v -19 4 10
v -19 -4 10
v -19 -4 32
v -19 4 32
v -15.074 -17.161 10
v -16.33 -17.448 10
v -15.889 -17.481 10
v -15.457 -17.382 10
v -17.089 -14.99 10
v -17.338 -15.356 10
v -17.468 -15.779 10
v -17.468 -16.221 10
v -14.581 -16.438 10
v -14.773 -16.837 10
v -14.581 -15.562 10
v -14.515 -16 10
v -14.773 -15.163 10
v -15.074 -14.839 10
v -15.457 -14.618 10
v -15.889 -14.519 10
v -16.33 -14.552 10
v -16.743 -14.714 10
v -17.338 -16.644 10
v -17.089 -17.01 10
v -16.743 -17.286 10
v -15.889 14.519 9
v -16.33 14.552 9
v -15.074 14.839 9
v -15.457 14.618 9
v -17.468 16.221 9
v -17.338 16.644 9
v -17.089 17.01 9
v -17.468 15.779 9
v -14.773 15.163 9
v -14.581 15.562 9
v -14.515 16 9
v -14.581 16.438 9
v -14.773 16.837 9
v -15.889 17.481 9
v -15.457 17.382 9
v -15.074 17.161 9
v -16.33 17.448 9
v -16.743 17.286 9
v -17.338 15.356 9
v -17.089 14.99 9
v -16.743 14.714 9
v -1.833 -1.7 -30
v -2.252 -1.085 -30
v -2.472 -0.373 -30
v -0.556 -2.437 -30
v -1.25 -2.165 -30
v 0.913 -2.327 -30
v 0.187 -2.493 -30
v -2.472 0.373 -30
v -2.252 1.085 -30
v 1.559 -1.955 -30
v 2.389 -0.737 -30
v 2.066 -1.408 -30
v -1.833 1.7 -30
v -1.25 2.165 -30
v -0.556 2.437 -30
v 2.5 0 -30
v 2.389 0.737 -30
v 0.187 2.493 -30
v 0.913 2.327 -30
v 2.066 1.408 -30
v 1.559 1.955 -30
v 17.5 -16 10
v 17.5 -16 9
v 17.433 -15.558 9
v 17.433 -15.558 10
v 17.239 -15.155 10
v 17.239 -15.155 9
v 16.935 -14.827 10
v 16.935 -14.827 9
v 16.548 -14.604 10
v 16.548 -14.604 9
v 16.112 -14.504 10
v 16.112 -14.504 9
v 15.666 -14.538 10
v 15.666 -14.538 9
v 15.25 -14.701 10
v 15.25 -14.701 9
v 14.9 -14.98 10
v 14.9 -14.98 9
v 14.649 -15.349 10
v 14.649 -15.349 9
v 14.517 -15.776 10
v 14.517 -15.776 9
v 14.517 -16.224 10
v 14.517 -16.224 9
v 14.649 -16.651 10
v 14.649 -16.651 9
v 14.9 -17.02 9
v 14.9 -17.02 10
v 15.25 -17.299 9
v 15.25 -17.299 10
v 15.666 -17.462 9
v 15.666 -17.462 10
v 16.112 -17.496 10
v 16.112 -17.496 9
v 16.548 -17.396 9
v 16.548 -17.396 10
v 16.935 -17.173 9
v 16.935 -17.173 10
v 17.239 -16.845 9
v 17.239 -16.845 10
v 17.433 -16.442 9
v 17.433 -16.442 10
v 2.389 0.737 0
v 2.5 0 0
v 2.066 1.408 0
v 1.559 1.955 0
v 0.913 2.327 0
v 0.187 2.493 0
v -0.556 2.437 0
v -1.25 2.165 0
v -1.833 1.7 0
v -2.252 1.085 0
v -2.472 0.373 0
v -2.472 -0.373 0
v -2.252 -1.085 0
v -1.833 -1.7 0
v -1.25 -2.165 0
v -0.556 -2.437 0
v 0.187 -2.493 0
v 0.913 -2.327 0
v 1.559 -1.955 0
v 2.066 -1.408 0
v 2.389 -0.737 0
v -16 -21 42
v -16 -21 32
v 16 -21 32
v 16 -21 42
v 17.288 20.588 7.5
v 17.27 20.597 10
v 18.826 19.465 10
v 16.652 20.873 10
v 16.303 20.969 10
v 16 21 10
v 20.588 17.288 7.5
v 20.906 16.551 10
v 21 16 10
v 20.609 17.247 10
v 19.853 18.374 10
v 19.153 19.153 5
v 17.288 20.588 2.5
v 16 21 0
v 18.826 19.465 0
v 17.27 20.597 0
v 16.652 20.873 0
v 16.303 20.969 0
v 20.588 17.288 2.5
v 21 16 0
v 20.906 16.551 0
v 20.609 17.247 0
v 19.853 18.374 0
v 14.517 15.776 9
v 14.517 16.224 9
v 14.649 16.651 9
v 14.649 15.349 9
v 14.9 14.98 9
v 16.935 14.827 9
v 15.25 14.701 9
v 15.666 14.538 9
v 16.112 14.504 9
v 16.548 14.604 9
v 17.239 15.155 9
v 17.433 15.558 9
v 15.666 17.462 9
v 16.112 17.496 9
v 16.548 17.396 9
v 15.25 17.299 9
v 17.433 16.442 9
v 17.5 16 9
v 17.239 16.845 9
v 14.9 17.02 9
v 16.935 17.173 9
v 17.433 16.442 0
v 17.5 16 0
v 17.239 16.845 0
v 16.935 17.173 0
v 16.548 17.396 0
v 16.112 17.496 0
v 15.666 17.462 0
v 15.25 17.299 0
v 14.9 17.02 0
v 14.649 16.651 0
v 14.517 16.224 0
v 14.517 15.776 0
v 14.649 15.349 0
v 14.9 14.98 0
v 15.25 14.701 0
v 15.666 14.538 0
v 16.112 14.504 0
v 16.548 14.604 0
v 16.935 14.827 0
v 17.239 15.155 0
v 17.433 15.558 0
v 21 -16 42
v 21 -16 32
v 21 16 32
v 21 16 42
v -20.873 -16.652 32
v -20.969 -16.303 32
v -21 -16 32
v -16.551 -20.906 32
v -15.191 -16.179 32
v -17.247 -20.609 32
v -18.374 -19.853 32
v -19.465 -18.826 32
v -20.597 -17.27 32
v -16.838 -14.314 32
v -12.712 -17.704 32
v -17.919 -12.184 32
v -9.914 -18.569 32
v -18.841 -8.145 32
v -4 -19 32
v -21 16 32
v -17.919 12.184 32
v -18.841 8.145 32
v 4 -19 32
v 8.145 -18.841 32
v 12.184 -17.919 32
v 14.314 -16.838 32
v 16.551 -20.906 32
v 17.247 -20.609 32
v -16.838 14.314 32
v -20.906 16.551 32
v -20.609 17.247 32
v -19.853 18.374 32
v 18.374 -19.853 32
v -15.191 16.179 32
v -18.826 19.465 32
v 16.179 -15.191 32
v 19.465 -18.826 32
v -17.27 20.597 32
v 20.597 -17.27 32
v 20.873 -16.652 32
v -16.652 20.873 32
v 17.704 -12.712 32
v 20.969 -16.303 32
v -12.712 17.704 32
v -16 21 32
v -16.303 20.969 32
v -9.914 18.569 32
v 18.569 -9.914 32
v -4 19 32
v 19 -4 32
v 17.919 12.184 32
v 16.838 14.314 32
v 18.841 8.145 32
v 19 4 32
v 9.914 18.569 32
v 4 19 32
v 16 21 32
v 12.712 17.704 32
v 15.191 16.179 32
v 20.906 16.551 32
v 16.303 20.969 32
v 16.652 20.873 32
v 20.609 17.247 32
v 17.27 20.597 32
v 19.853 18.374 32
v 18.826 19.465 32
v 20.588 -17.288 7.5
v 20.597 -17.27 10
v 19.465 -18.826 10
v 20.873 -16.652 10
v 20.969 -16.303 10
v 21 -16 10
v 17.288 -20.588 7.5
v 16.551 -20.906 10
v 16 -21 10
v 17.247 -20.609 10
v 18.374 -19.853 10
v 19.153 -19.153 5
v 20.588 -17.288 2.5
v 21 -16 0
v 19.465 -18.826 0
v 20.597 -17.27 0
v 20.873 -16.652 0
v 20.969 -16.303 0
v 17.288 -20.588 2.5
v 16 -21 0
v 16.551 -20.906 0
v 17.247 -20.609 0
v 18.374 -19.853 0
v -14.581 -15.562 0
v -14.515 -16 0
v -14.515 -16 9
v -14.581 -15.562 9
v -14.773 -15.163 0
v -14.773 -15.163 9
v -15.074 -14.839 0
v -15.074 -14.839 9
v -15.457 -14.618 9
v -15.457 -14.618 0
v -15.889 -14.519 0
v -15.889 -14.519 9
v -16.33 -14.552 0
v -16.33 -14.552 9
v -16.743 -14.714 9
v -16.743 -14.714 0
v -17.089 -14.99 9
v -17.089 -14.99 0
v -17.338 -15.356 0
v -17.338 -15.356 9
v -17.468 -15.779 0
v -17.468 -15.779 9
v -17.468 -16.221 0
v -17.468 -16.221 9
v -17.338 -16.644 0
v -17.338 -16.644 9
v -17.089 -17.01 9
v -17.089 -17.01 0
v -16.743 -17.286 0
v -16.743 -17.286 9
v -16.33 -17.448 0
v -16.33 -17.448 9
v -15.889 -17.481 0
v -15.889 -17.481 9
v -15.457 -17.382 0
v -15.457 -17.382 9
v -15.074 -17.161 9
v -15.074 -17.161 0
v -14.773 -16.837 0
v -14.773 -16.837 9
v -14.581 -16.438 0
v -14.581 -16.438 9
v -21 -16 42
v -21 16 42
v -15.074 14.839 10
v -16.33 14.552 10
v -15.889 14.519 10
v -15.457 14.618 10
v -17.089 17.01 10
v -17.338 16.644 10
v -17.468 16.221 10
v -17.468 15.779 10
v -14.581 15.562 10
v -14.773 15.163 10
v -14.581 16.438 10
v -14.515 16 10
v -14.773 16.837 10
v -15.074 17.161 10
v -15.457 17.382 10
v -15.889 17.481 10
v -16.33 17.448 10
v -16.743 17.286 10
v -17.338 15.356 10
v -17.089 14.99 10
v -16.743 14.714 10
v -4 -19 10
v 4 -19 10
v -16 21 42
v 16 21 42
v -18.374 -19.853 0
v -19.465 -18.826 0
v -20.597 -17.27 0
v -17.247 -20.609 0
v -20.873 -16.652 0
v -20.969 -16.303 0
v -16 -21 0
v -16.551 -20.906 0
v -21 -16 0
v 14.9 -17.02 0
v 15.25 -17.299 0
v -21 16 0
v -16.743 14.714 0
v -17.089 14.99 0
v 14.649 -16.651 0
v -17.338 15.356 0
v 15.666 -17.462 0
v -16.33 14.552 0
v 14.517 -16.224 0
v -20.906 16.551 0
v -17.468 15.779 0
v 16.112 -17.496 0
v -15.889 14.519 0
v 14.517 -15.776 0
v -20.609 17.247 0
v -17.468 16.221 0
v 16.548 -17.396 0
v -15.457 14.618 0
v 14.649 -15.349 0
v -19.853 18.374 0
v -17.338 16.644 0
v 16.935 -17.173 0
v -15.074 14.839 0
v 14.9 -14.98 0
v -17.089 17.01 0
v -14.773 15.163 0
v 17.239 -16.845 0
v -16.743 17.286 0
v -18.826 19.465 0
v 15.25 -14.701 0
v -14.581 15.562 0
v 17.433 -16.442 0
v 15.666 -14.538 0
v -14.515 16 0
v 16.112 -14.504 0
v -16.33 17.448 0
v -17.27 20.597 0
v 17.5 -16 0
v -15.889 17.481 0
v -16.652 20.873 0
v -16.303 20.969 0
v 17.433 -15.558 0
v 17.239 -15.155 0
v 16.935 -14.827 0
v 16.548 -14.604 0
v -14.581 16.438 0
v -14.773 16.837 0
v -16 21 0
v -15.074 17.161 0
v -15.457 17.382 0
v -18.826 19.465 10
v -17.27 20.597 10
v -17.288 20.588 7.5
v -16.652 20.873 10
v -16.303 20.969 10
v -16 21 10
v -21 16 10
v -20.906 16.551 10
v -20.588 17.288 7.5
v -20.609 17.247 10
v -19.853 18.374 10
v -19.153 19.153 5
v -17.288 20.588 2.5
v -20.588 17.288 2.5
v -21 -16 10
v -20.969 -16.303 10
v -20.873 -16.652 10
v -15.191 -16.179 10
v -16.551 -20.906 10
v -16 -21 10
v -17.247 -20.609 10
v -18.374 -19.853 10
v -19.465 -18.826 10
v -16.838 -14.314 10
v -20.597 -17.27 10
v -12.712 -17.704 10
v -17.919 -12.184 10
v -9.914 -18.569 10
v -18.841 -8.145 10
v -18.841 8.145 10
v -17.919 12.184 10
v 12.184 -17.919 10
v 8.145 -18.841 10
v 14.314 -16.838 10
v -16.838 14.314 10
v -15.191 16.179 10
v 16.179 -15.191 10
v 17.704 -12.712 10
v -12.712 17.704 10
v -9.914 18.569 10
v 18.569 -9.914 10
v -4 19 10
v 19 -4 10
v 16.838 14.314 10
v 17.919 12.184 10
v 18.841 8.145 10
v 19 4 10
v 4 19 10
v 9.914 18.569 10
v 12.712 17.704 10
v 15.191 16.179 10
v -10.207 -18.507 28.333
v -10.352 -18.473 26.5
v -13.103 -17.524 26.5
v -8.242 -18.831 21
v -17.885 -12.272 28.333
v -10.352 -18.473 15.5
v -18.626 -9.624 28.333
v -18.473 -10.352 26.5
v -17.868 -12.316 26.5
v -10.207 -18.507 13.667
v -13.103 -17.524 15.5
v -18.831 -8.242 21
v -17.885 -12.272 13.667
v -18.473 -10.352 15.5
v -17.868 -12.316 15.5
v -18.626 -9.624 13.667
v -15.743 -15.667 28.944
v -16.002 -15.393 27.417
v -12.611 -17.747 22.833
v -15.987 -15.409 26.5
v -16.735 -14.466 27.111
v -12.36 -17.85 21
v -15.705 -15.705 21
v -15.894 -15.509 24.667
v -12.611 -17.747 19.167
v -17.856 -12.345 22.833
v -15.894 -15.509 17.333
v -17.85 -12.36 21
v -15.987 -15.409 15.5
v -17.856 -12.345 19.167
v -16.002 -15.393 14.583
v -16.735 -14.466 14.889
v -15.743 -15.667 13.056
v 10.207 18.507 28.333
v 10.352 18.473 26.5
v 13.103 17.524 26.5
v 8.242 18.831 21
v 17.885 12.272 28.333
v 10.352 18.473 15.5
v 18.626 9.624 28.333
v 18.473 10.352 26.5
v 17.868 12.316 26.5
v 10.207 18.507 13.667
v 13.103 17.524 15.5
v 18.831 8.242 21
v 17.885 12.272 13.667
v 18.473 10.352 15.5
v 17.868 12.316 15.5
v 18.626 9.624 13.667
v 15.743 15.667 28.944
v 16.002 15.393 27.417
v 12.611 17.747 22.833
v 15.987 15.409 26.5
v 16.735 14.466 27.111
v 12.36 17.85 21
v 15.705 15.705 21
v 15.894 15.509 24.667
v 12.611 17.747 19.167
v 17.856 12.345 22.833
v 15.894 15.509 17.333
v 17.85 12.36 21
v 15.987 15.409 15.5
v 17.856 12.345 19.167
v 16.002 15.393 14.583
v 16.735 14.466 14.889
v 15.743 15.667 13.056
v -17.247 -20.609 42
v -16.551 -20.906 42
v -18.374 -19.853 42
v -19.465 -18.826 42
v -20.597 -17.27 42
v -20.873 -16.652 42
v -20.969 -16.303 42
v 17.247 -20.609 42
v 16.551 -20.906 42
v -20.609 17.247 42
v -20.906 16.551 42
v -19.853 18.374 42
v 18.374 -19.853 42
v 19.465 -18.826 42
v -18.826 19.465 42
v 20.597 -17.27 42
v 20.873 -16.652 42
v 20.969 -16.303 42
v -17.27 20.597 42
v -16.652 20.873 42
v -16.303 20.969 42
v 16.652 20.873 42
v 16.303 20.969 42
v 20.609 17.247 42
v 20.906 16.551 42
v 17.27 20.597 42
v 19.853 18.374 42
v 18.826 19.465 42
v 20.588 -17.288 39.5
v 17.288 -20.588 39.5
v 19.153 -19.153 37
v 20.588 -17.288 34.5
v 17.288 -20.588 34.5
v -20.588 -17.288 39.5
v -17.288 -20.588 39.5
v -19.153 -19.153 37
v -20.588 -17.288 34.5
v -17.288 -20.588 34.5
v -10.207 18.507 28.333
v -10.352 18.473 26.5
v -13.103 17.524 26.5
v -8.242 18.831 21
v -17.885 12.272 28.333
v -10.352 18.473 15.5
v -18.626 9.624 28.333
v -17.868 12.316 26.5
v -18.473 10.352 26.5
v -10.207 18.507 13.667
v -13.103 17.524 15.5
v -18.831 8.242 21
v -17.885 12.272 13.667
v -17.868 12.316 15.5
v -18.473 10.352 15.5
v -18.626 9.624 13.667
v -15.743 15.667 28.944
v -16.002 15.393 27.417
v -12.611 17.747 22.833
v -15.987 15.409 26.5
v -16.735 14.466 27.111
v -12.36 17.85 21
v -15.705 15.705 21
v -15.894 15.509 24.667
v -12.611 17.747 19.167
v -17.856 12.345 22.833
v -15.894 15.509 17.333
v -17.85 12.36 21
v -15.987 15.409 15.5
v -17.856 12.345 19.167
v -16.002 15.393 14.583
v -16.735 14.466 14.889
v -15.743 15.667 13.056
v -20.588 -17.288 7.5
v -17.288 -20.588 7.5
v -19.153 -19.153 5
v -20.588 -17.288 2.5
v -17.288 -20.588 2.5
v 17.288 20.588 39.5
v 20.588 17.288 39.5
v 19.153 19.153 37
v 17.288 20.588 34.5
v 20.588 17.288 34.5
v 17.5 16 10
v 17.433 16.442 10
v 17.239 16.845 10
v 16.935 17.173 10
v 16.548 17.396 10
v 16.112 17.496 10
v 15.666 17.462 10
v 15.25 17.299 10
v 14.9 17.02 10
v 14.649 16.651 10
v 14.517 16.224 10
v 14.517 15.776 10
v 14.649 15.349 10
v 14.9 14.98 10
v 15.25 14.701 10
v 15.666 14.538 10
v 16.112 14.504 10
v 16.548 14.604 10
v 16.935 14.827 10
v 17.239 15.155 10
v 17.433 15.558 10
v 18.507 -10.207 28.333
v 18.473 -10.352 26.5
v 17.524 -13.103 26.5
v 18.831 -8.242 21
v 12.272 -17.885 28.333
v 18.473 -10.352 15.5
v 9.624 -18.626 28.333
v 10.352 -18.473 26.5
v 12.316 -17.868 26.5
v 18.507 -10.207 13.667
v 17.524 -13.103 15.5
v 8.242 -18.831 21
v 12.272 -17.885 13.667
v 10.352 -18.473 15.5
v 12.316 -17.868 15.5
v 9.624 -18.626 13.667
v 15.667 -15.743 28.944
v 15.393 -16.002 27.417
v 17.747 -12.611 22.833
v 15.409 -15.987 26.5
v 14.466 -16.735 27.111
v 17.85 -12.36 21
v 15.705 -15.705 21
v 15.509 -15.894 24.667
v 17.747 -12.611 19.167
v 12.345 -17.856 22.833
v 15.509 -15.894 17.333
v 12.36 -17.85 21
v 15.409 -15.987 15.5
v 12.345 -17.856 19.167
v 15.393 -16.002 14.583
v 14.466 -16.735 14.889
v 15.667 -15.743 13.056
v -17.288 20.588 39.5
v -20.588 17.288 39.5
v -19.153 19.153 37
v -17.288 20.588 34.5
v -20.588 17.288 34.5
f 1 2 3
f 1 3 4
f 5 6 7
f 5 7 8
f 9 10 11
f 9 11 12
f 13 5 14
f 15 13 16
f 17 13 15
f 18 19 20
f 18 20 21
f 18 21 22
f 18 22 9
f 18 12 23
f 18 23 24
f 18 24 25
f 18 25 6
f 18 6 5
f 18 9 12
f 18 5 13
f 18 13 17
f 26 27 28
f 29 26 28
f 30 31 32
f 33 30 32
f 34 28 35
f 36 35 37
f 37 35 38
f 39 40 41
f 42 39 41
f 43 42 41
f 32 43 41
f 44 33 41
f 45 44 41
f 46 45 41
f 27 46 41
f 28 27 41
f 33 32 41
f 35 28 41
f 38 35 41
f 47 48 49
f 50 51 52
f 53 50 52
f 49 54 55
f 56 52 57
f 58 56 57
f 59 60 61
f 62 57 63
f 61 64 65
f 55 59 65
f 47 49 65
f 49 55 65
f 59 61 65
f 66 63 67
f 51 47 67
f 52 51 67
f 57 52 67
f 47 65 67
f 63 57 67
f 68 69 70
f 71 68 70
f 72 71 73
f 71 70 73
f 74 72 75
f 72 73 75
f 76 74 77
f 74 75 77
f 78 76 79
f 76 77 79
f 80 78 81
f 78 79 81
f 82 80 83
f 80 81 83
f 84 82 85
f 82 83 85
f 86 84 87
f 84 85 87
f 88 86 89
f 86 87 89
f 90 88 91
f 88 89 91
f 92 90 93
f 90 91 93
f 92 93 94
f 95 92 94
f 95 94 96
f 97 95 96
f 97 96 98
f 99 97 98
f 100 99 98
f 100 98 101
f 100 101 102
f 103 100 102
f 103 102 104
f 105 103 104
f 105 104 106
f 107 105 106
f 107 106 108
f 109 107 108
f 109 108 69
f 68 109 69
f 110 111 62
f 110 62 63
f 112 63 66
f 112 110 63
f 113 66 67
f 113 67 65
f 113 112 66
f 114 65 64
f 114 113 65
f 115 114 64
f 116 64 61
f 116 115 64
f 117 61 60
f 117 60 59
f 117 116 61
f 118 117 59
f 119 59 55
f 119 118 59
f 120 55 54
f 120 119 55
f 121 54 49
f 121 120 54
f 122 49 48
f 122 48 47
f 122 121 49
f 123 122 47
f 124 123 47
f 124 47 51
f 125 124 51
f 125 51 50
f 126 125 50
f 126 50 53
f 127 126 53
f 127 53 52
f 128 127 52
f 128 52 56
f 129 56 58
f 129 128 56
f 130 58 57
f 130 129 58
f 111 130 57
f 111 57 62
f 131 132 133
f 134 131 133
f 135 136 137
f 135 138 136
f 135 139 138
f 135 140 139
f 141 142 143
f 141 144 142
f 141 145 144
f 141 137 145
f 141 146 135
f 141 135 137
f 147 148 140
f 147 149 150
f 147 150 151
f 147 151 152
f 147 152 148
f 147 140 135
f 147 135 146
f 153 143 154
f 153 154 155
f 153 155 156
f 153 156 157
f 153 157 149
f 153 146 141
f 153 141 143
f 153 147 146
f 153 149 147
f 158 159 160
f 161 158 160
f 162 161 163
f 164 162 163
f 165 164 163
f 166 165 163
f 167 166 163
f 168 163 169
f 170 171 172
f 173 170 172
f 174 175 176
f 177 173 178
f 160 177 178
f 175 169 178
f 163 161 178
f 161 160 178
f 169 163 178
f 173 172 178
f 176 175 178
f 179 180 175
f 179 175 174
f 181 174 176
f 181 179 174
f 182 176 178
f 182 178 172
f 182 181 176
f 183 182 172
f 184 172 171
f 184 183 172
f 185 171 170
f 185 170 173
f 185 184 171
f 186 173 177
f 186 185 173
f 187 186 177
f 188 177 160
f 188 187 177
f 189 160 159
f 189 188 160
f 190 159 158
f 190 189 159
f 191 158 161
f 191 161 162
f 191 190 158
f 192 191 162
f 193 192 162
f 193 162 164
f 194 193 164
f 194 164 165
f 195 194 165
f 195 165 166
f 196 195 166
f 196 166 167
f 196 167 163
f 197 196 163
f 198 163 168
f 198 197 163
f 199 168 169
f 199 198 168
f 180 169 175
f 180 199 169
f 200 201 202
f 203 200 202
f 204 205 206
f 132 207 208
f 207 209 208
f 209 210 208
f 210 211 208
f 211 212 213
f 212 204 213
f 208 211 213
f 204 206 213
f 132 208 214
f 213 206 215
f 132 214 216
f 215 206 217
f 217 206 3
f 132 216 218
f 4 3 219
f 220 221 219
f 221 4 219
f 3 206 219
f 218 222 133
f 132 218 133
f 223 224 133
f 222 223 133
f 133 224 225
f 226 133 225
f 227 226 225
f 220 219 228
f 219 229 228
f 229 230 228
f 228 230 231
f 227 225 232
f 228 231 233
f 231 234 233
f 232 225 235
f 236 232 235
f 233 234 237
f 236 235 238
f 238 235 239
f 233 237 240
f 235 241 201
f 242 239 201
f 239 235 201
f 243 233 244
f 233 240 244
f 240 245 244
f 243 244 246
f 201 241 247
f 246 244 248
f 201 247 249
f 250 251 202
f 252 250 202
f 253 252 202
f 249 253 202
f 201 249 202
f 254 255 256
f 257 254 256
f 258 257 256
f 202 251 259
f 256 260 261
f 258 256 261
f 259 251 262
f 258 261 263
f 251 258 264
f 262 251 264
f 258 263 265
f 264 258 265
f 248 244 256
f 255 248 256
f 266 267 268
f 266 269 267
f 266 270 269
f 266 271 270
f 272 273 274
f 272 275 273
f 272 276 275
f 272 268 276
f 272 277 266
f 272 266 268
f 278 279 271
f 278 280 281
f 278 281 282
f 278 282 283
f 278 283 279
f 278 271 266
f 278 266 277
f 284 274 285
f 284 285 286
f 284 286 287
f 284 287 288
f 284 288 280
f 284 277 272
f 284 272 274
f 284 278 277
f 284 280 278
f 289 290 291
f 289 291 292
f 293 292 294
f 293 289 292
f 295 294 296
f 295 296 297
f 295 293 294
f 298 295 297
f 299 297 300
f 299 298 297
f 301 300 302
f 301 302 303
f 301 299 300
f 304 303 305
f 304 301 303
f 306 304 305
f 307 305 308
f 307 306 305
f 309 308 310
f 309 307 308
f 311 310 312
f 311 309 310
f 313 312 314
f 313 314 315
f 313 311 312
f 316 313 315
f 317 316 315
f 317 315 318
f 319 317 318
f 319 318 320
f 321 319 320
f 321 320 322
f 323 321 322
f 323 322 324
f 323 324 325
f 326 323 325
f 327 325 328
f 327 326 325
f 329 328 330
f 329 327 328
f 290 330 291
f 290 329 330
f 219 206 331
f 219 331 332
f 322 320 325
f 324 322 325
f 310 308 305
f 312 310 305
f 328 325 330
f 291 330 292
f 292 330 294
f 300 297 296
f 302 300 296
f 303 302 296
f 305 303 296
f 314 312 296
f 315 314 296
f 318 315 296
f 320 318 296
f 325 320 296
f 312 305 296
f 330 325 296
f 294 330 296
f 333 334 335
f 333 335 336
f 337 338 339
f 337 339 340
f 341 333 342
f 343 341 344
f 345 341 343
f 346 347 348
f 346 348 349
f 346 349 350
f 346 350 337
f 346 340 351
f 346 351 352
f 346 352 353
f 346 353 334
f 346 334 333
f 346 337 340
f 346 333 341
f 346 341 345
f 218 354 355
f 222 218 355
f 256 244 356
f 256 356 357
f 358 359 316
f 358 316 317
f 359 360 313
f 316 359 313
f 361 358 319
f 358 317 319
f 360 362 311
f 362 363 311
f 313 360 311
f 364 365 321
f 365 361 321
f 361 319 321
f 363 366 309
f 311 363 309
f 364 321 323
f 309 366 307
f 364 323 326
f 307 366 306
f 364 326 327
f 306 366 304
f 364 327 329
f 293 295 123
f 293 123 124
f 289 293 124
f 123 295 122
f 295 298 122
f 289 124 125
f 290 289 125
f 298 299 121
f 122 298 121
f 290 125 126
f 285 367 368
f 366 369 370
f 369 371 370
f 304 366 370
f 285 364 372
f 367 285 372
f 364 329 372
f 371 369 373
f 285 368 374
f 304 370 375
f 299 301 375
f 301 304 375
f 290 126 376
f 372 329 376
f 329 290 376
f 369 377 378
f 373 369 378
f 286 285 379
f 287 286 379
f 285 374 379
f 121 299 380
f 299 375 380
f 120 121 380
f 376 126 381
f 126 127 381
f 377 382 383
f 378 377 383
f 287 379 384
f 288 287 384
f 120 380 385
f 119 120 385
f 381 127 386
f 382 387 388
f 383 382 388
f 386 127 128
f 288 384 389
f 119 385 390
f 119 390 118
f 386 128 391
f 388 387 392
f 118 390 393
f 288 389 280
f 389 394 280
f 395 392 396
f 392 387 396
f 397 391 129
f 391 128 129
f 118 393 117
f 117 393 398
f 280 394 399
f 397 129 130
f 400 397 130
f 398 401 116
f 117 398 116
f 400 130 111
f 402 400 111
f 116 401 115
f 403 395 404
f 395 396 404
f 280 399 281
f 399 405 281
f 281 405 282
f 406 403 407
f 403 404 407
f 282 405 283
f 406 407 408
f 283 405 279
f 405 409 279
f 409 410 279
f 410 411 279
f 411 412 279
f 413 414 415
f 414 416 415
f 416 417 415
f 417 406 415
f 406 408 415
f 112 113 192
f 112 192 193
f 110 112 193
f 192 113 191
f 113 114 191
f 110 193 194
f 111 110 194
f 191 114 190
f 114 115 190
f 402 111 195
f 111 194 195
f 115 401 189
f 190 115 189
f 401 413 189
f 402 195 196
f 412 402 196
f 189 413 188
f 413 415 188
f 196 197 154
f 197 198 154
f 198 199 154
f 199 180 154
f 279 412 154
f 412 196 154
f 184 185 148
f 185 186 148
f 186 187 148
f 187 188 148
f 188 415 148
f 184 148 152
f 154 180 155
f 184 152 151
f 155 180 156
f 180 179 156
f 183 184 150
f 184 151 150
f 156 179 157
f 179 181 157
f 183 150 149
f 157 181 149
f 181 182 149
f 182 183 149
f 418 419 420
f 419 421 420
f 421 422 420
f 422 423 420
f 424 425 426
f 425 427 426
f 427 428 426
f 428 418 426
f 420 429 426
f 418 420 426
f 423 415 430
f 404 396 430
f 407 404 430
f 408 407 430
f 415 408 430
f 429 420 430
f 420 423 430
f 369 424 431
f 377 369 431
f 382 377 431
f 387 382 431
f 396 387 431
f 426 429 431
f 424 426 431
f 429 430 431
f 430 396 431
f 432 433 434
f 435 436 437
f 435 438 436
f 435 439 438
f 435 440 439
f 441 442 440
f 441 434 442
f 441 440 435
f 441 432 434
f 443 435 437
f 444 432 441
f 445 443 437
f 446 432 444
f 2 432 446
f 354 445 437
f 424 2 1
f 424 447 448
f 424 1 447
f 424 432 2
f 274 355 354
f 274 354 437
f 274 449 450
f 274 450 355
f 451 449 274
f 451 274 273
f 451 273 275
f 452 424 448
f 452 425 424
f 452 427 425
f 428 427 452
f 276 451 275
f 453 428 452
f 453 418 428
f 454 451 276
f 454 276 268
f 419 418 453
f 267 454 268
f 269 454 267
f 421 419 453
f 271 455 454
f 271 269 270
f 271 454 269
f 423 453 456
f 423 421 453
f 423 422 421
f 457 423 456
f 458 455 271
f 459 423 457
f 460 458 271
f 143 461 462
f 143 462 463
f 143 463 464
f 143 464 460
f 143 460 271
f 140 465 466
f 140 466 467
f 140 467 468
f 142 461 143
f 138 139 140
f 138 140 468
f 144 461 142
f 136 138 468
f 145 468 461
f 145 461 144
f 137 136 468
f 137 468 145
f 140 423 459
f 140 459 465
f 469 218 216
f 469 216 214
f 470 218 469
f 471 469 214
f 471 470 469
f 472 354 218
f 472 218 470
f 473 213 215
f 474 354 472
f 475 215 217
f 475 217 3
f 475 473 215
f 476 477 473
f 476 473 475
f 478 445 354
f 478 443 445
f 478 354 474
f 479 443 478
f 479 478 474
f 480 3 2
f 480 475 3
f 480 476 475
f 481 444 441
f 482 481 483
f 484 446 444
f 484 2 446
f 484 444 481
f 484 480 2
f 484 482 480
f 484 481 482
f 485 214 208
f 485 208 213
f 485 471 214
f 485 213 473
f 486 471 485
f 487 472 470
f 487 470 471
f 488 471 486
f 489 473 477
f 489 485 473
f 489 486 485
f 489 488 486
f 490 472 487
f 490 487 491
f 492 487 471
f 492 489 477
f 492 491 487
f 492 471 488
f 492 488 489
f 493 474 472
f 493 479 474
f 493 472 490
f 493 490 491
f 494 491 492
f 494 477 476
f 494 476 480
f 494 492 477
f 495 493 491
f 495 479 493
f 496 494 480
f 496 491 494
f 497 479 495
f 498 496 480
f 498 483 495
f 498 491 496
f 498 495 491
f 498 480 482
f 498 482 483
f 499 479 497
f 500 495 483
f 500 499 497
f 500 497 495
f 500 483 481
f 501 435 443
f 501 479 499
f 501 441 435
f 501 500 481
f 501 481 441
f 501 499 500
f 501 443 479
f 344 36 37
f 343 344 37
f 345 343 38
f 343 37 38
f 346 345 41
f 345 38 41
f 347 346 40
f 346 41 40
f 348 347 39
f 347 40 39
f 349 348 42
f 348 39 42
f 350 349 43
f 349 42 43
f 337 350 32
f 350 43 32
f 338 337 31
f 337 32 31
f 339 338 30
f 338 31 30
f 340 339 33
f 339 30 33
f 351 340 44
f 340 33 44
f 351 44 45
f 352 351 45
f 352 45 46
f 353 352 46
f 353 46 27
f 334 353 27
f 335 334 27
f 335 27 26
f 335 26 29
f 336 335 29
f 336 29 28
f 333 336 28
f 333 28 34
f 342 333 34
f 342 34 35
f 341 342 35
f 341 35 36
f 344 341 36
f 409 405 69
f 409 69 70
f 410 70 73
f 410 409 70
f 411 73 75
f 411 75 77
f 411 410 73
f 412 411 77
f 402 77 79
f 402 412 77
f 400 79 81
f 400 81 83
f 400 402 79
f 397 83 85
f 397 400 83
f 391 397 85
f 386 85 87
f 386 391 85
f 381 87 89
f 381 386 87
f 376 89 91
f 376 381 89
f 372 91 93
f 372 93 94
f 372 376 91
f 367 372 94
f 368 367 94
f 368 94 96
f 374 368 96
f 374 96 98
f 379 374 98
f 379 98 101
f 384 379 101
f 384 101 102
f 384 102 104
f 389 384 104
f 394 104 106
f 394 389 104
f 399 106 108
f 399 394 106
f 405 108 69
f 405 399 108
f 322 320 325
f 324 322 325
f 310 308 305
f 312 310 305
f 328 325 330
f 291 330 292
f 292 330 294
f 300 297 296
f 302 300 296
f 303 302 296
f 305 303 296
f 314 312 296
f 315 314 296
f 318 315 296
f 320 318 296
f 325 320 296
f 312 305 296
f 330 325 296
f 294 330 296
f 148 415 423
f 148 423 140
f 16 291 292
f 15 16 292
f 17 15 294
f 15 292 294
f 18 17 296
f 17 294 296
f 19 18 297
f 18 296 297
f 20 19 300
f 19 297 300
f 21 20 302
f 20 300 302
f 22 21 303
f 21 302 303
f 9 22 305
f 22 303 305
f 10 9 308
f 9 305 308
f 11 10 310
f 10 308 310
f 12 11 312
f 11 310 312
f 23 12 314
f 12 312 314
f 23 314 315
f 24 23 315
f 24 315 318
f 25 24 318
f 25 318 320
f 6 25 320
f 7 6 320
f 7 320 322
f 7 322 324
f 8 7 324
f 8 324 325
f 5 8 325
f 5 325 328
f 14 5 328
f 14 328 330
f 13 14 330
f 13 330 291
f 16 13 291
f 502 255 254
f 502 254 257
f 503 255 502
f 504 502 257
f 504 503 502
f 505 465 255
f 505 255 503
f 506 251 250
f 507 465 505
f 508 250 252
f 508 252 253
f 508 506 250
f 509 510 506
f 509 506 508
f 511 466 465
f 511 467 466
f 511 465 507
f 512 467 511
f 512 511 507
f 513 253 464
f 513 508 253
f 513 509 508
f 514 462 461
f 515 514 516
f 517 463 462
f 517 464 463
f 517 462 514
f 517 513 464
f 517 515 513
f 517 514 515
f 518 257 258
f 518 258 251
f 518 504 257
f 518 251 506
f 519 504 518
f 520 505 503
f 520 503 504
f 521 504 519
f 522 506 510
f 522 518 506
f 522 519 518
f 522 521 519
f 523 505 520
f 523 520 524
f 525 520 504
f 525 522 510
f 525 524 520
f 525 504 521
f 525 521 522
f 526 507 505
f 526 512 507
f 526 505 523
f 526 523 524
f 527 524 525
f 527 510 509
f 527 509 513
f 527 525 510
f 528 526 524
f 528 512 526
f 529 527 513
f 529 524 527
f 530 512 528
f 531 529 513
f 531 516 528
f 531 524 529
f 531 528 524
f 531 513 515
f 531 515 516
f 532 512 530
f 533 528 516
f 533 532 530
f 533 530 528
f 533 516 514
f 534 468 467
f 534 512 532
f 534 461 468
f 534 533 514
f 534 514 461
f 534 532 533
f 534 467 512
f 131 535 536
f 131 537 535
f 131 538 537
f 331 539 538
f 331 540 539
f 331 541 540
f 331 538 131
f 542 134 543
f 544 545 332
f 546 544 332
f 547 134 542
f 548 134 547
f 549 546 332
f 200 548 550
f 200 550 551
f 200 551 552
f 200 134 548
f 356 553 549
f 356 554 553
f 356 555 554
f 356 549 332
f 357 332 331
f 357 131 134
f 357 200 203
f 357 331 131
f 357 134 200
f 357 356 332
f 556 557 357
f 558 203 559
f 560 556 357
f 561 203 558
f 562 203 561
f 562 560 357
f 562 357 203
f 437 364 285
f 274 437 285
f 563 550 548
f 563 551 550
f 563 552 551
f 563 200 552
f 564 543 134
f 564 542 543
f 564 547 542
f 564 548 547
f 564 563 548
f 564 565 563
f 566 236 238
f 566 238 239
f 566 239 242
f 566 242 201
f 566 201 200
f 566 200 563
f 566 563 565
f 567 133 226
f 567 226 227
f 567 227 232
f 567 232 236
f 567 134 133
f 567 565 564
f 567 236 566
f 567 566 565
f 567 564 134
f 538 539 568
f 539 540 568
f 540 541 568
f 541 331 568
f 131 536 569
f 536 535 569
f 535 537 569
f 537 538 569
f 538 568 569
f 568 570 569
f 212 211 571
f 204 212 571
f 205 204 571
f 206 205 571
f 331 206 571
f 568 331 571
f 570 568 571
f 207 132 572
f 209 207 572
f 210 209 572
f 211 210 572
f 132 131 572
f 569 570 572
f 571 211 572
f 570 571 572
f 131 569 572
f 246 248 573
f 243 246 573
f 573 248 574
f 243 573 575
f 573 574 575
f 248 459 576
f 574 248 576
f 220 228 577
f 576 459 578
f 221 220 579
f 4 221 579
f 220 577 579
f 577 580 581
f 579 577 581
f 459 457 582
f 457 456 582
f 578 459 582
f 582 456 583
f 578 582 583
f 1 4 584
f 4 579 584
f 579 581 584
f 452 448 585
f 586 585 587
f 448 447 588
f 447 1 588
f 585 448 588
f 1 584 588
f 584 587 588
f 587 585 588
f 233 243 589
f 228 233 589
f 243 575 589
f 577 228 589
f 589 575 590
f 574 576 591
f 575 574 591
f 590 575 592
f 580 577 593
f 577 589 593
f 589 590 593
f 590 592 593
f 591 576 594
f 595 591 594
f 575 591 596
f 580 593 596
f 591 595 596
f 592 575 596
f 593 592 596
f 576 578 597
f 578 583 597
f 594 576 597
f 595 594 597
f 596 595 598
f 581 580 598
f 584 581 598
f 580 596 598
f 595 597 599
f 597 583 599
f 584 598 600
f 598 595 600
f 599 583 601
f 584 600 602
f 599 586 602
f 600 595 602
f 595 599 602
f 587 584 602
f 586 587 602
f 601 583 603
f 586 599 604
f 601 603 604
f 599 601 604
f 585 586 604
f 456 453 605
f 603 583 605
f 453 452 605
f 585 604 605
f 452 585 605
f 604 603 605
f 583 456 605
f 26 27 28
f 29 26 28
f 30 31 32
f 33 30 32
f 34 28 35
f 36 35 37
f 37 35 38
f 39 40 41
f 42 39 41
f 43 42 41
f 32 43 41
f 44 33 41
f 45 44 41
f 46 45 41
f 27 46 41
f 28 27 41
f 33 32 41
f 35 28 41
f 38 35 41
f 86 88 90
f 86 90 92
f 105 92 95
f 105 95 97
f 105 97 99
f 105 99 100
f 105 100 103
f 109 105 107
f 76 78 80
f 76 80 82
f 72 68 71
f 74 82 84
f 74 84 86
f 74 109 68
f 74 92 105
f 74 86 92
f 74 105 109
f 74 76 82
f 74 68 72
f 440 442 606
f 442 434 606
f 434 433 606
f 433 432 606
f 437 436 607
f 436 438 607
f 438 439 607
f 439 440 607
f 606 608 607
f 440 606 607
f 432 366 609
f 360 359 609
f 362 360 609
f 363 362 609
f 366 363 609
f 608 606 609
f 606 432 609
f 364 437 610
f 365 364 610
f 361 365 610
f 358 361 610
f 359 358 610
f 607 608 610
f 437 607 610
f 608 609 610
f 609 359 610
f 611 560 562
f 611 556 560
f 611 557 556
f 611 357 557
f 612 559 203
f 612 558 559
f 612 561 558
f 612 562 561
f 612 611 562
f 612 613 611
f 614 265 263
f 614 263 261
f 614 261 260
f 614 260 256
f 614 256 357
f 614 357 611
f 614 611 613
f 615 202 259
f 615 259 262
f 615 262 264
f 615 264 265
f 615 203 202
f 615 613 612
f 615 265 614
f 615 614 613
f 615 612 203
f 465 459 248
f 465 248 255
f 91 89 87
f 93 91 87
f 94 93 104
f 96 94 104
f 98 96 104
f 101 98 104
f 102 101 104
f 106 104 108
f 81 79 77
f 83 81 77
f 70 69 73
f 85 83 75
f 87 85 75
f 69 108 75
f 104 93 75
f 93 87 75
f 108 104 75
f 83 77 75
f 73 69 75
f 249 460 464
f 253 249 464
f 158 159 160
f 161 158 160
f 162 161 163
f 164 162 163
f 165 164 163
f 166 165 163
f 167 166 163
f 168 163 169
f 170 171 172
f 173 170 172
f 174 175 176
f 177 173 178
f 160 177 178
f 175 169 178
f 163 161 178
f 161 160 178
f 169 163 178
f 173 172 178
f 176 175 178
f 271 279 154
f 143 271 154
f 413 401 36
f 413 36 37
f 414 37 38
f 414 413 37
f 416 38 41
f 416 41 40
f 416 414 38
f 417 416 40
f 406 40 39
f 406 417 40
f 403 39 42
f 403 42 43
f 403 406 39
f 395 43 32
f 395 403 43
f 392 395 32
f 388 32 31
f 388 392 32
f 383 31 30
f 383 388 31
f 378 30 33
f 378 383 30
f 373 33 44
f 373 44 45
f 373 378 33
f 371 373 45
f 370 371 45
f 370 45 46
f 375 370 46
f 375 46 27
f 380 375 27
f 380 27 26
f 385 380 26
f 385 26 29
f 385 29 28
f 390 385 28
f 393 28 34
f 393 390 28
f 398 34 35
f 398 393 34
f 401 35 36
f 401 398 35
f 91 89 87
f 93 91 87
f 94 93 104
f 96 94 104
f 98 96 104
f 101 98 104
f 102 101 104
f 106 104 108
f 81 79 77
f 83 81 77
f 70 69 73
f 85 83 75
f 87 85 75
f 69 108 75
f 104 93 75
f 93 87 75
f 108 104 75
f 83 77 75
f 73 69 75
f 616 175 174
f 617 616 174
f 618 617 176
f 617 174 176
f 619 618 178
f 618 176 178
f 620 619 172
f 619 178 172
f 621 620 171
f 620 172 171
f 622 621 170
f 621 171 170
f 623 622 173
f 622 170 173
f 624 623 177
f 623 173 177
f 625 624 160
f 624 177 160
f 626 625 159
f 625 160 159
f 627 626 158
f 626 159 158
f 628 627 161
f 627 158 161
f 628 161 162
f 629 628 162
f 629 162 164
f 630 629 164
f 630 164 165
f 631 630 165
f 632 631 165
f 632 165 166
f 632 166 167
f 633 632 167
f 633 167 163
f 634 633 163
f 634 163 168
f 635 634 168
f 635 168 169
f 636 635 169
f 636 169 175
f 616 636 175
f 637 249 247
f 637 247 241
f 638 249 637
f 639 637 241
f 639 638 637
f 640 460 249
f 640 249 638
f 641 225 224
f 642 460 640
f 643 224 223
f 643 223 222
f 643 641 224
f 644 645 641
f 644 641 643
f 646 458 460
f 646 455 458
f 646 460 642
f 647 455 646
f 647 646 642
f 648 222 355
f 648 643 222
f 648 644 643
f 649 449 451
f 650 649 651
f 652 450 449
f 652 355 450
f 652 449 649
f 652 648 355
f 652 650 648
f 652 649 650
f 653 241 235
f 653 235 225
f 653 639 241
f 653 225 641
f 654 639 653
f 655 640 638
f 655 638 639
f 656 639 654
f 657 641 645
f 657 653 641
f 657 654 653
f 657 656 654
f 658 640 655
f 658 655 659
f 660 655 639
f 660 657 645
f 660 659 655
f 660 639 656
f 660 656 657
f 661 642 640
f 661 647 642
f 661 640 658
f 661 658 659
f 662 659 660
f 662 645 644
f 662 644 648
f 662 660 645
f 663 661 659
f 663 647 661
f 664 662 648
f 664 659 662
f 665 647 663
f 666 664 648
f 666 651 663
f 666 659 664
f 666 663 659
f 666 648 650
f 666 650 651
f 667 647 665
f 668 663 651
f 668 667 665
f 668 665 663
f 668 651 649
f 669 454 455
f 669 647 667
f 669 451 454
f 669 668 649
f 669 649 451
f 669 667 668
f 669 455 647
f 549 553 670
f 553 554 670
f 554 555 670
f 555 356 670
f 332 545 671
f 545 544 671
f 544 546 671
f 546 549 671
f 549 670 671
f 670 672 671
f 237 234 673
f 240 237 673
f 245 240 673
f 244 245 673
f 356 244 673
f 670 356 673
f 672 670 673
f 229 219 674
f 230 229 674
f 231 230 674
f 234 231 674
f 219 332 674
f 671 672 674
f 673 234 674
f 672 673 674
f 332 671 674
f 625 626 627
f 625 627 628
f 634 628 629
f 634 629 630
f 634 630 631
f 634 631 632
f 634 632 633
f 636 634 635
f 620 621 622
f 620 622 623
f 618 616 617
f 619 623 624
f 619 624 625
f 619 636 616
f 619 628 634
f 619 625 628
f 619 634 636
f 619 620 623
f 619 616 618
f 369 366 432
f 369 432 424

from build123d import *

# Parameters (mm, degrees)
BOSS_EXTRUDE1_START   = 10
SKETCH1_W             = 38
SKETCH1_H             = 38
BOSS_EXTRUDE1_DEPTH   = 22
SKETCH2_W             = 42
SKETCH2_H             = 42
BOSS_EXTRUDE2_DEPTH   = 10
BOSS_EXTRUDE3_START   = 32
SKETCH4_W             = 42
SKETCH4_H             = 42
BOSS_EXTRUDE3_DEPTH   = 10
FILLET1_SIZE          = 15
FILLET2_SIZE          = 5
SKETCH5_R             = 2.5
BOSS_EXTRUDE4_DEPTH   = 30
SKETCH6_R             = 1.5
BOSS_EXTRUDE5_DEPTH   = 10
SKETCH6_R_2           = 1.485008889
BOSS_EXTRUDE5_2_DEPTH = 10
BOSS_EXTRUDE5_3_DEPTH = 10
BOSS_EXTRUDE5_4_DEPTH = 10
SKETCH6_2_R           = 1.5
SKETCH6_2_R_2         = 1.485008889
CUT_EXTRUDE1_DEPTH    = 9


with BuildPart() as part:
    # Sketch1 → Boss-Extrude1 (new body)
    with BuildSketch(Plane.XY.offset(BOSS_EXTRUDE1_START)):
        Rectangle(SKETCH1_W, SKETCH1_H)
    extrude(amount=BOSS_EXTRUDE1_DEPTH)

    # Sketch2 → Boss-Extrude2 (add)
    with BuildSketch(Plane.XY):
        Rectangle(SKETCH2_W, SKETCH2_H)
    extrude(amount=BOSS_EXTRUDE2_DEPTH)

    # Sketch4 → Boss-Extrude3 (add)
    with BuildSketch(Plane.XY.offset(BOSS_EXTRUDE3_START)):
        Rectangle(SKETCH4_W, SKETCH4_H)
    extrude(amount=BOSS_EXTRUDE3_DEPTH)

    # Fillet1
    # a fillet whose section is not a circle: 15 mm, written as the material it takes off along each edge
    with BuildSketch(Plane(origin=(-19, 19, 10), x_dir=(1, 0, 0), z_dir=(0, 0, 1))) as fillet1_piece_1:
        with BuildLine():
            add(Edge.make_bspline([(FILLET1_SIZE, 0), (FILLET1_SIZE * 0.831801948466, 0), (FILLET1_SIZE * 0.663603896932, 0), (FILLET1_SIZE * 0.292893218813, -FILLET1_SIZE * 0.0716919198361), (FILLET1_SIZE * 0.0716919198361, -FILLET1_SIZE * 0.292893218813), (0, -FILLET1_SIZE * 0.663603896932), (0, -FILLET1_SIZE * 0.831801948466), (0, -FILLET1_SIZE)], knots=[0, 0, 0, 0, 0, 0, 0.5, 0.5, 1, 1, 1, 1, 1, 1], degree=5))
            Line((0, -FILLET1_SIZE), (-FILLET1_SIZE * 0.02, -FILLET1_SIZE))
            Line((-FILLET1_SIZE * 0.02, -FILLET1_SIZE), (-FILLET1_SIZE * 0.02, FILLET1_SIZE * 0.02))
            Line((-FILLET1_SIZE * 0.02, FILLET1_SIZE * 0.02), (FILLET1_SIZE, FILLET1_SIZE * 0.02))
            Line((FILLET1_SIZE, FILLET1_SIZE * 0.02), (FILLET1_SIZE, 0))
        make_face()
    extrude(amount=22, mode=Mode.SUBTRACT)
    with BuildSketch(Plane(origin=(-19, -19, 10), x_dir=(1, 0, 0), z_dir=(0, 0, 1)), Plane(origin=(19, -19, 10), x_dir=(0, 1, 0), z_dir=(0, 0, 1)), Plane(origin=(19, 19, 10), x_dir=(-1, 0, 0), z_dir=(0, 0, 1))) as fillet1_piece_2:
        with BuildLine():
            add(Edge.make_bspline([(FILLET1_SIZE, 0), (FILLET1_SIZE * 0.831801948466, 0), (FILLET1_SIZE * 0.663603896932, 0), (FILLET1_SIZE * 0.292893218813, FILLET1_SIZE * 0.0716919198361), (FILLET1_SIZE * 0.0716919198361, FILLET1_SIZE * 0.292893218813), (0, FILLET1_SIZE * 0.663603896932), (0, FILLET1_SIZE * 0.831801948466), (0, FILLET1_SIZE)], knots=[0, 0, 0, 0, 0, 0, 0.5, 0.5, 1, 1, 1, 1, 1, 1], degree=5))
            Line((0, FILLET1_SIZE), (-FILLET1_SIZE * 0.02, FILLET1_SIZE))
            Line((-FILLET1_SIZE * 0.02, FILLET1_SIZE), (-FILLET1_SIZE * 0.02, -FILLET1_SIZE * 0.02))
            Line((-FILLET1_SIZE * 0.02, -FILLET1_SIZE * 0.02), (FILLET1_SIZE, -FILLET1_SIZE * 0.02))
            Line((FILLET1_SIZE, -FILLET1_SIZE * 0.02), (FILLET1_SIZE, 0))
        make_face()
    extrude(amount=22, mode=Mode.SUBTRACT)

    # Fillet2
    # a fillet whose section is not a circle: 5 mm, written as the material it takes off along each edge
    with BuildSketch(Plane(origin=(-21, -21, 19.5), x_dir=(0, 1, 0), z_dir=(0, 0, 1)), Plane(origin=(-21, -21, -12.5), x_dir=(0, 1, 0), z_dir=(0, 0, 1)), Plane(origin=(-21, 21, -12.5), x_dir=(1, 0, 0), z_dir=(0, 0, 1)), Plane(origin=(-21, 21, 19.5), x_dir=(1, 0, 0), z_dir=(0, 0, 1))) as fillet2_piece_1:
        with BuildLine():
            Bezier((FILLET2_SIZE, 0), (0, 0), (0, -FILLET2_SIZE), weights=[1, 0.353553391, 1])
            Line((0, -FILLET2_SIZE), (0, 0))
            Line((0, 0), (FILLET2_SIZE, 0))
        make_face()
    extrude(amount=35, mode=Mode.SUBTRACT)
    with BuildSketch(Plane(origin=(21, -21, -12.5), x_dir=(0, 1, 0), z_dir=(0, 0, 1)), Plane(origin=(21, -21, 19.5), x_dir=(0, 1, 0), z_dir=(0, 0, 1)), Plane(origin=(21, 21, -12.5), x_dir=(-1, 0, 0), z_dir=(0, 0, 1)), Plane(origin=(21, 21, 19.5), x_dir=(-1, 0, 0), z_dir=(0, 0, 1))) as fillet2_piece_2:
        with BuildLine():
            Bezier((FILLET2_SIZE, 0), (0, 0), (0, FILLET2_SIZE), weights=[1, 0.353553391, 1])
            Line((0, FILLET2_SIZE), (0, 0))
            Line((0, 0), (FILLET2_SIZE, 0))
        make_face()
    extrude(amount=35, mode=Mode.SUBTRACT)

    # Sketch5 → Boss-Extrude4 (add)
    with BuildSketch(Plane.XY):
        Circle(SKETCH5_R)
    extrude(amount=-BOSS_EXTRUDE4_DEPTH)


with BuildPart() as body_2:
    # Sketch6 → Boss-Extrude5 (new body)
    with BuildSketch(Plane.XY):
        with Locations((16, 16)):
            Circle(SKETCH6_R)
    extrude(amount=BOSS_EXTRUDE5_DEPTH)


with BuildPart() as body_3:
    # Sketch6 → Boss-Extrude5 2 (new body)
    with BuildSketch(Plane.XY):
        with Locations((-16, 16)):
            Circle(SKETCH6_R_2)
    extrude(amount=BOSS_EXTRUDE5_2_DEPTH)


with BuildPart() as body_4:
    # Sketch6 → Boss-Extrude5 3 (new body)
    with BuildSketch(Plane.XY):
        with Locations((16, -16)):
            Circle(SKETCH6_R)
    extrude(amount=BOSS_EXTRUDE5_3_DEPTH)


with BuildPart() as body_5:
    # Sketch6 → Boss-Extrude5 4 (new body)
    with BuildSketch(Plane.XY):
        with Locations((-16, -16)):
            Circle(SKETCH6_R_2)
    extrude(amount=BOSS_EXTRUDE5_4_DEPTH)


with BuildPart() as cut_extrude1_tool:
    # Sketch6<2> → Cut-Extrude1 (new body)
    with BuildSketch(Plane.XY):
        with Locations((16, 16)):
            Circle(SKETCH6_2_R)
        with Locations((-16, 16)):
            Circle(SKETCH6_2_R_2)
        with Locations((16, -16)):
            Circle(SKETCH6_2_R)
        with Locations((-16, -16)):
            Circle(SKETCH6_2_R_2)
    extrude(amount=CUT_EXTRUDE1_DEPTH)


with BuildPart() as part_1:
    add(part.part)

    # Cut-Extrude1: cut by cut_extrude1_tool
    add(cut_extrude1_tool.part, mode=Mode.SUBTRACT)


with BuildPart() as body_2_1:
    add(body_2.part)

    # Cut-Extrude1: cut by cut_extrude1_tool
    add(cut_extrude1_tool.part, mode=Mode.SUBTRACT)


with BuildPart() as body_3_1:
    add(body_3.part)

    # Cut-Extrude1: cut by cut_extrude1_tool
    add(cut_extrude1_tool.part, mode=Mode.SUBTRACT)


with BuildPart() as body_4_1:
    add(body_4.part)

    # Cut-Extrude1: cut by cut_extrude1_tool
    add(cut_extrude1_tool.part, mode=Mode.SUBTRACT)


with BuildPart() as body_5_1:
    add(body_5.part)

    # Cut-Extrude1: cut by cut_extrude1_tool
    add(cut_extrude1_tool.part, mode=Mode.SUBTRACT)


solid = Compound([part_1.part, body_2_1.part, body_3_1.part, body_4_1.part, body_5_1.part])
